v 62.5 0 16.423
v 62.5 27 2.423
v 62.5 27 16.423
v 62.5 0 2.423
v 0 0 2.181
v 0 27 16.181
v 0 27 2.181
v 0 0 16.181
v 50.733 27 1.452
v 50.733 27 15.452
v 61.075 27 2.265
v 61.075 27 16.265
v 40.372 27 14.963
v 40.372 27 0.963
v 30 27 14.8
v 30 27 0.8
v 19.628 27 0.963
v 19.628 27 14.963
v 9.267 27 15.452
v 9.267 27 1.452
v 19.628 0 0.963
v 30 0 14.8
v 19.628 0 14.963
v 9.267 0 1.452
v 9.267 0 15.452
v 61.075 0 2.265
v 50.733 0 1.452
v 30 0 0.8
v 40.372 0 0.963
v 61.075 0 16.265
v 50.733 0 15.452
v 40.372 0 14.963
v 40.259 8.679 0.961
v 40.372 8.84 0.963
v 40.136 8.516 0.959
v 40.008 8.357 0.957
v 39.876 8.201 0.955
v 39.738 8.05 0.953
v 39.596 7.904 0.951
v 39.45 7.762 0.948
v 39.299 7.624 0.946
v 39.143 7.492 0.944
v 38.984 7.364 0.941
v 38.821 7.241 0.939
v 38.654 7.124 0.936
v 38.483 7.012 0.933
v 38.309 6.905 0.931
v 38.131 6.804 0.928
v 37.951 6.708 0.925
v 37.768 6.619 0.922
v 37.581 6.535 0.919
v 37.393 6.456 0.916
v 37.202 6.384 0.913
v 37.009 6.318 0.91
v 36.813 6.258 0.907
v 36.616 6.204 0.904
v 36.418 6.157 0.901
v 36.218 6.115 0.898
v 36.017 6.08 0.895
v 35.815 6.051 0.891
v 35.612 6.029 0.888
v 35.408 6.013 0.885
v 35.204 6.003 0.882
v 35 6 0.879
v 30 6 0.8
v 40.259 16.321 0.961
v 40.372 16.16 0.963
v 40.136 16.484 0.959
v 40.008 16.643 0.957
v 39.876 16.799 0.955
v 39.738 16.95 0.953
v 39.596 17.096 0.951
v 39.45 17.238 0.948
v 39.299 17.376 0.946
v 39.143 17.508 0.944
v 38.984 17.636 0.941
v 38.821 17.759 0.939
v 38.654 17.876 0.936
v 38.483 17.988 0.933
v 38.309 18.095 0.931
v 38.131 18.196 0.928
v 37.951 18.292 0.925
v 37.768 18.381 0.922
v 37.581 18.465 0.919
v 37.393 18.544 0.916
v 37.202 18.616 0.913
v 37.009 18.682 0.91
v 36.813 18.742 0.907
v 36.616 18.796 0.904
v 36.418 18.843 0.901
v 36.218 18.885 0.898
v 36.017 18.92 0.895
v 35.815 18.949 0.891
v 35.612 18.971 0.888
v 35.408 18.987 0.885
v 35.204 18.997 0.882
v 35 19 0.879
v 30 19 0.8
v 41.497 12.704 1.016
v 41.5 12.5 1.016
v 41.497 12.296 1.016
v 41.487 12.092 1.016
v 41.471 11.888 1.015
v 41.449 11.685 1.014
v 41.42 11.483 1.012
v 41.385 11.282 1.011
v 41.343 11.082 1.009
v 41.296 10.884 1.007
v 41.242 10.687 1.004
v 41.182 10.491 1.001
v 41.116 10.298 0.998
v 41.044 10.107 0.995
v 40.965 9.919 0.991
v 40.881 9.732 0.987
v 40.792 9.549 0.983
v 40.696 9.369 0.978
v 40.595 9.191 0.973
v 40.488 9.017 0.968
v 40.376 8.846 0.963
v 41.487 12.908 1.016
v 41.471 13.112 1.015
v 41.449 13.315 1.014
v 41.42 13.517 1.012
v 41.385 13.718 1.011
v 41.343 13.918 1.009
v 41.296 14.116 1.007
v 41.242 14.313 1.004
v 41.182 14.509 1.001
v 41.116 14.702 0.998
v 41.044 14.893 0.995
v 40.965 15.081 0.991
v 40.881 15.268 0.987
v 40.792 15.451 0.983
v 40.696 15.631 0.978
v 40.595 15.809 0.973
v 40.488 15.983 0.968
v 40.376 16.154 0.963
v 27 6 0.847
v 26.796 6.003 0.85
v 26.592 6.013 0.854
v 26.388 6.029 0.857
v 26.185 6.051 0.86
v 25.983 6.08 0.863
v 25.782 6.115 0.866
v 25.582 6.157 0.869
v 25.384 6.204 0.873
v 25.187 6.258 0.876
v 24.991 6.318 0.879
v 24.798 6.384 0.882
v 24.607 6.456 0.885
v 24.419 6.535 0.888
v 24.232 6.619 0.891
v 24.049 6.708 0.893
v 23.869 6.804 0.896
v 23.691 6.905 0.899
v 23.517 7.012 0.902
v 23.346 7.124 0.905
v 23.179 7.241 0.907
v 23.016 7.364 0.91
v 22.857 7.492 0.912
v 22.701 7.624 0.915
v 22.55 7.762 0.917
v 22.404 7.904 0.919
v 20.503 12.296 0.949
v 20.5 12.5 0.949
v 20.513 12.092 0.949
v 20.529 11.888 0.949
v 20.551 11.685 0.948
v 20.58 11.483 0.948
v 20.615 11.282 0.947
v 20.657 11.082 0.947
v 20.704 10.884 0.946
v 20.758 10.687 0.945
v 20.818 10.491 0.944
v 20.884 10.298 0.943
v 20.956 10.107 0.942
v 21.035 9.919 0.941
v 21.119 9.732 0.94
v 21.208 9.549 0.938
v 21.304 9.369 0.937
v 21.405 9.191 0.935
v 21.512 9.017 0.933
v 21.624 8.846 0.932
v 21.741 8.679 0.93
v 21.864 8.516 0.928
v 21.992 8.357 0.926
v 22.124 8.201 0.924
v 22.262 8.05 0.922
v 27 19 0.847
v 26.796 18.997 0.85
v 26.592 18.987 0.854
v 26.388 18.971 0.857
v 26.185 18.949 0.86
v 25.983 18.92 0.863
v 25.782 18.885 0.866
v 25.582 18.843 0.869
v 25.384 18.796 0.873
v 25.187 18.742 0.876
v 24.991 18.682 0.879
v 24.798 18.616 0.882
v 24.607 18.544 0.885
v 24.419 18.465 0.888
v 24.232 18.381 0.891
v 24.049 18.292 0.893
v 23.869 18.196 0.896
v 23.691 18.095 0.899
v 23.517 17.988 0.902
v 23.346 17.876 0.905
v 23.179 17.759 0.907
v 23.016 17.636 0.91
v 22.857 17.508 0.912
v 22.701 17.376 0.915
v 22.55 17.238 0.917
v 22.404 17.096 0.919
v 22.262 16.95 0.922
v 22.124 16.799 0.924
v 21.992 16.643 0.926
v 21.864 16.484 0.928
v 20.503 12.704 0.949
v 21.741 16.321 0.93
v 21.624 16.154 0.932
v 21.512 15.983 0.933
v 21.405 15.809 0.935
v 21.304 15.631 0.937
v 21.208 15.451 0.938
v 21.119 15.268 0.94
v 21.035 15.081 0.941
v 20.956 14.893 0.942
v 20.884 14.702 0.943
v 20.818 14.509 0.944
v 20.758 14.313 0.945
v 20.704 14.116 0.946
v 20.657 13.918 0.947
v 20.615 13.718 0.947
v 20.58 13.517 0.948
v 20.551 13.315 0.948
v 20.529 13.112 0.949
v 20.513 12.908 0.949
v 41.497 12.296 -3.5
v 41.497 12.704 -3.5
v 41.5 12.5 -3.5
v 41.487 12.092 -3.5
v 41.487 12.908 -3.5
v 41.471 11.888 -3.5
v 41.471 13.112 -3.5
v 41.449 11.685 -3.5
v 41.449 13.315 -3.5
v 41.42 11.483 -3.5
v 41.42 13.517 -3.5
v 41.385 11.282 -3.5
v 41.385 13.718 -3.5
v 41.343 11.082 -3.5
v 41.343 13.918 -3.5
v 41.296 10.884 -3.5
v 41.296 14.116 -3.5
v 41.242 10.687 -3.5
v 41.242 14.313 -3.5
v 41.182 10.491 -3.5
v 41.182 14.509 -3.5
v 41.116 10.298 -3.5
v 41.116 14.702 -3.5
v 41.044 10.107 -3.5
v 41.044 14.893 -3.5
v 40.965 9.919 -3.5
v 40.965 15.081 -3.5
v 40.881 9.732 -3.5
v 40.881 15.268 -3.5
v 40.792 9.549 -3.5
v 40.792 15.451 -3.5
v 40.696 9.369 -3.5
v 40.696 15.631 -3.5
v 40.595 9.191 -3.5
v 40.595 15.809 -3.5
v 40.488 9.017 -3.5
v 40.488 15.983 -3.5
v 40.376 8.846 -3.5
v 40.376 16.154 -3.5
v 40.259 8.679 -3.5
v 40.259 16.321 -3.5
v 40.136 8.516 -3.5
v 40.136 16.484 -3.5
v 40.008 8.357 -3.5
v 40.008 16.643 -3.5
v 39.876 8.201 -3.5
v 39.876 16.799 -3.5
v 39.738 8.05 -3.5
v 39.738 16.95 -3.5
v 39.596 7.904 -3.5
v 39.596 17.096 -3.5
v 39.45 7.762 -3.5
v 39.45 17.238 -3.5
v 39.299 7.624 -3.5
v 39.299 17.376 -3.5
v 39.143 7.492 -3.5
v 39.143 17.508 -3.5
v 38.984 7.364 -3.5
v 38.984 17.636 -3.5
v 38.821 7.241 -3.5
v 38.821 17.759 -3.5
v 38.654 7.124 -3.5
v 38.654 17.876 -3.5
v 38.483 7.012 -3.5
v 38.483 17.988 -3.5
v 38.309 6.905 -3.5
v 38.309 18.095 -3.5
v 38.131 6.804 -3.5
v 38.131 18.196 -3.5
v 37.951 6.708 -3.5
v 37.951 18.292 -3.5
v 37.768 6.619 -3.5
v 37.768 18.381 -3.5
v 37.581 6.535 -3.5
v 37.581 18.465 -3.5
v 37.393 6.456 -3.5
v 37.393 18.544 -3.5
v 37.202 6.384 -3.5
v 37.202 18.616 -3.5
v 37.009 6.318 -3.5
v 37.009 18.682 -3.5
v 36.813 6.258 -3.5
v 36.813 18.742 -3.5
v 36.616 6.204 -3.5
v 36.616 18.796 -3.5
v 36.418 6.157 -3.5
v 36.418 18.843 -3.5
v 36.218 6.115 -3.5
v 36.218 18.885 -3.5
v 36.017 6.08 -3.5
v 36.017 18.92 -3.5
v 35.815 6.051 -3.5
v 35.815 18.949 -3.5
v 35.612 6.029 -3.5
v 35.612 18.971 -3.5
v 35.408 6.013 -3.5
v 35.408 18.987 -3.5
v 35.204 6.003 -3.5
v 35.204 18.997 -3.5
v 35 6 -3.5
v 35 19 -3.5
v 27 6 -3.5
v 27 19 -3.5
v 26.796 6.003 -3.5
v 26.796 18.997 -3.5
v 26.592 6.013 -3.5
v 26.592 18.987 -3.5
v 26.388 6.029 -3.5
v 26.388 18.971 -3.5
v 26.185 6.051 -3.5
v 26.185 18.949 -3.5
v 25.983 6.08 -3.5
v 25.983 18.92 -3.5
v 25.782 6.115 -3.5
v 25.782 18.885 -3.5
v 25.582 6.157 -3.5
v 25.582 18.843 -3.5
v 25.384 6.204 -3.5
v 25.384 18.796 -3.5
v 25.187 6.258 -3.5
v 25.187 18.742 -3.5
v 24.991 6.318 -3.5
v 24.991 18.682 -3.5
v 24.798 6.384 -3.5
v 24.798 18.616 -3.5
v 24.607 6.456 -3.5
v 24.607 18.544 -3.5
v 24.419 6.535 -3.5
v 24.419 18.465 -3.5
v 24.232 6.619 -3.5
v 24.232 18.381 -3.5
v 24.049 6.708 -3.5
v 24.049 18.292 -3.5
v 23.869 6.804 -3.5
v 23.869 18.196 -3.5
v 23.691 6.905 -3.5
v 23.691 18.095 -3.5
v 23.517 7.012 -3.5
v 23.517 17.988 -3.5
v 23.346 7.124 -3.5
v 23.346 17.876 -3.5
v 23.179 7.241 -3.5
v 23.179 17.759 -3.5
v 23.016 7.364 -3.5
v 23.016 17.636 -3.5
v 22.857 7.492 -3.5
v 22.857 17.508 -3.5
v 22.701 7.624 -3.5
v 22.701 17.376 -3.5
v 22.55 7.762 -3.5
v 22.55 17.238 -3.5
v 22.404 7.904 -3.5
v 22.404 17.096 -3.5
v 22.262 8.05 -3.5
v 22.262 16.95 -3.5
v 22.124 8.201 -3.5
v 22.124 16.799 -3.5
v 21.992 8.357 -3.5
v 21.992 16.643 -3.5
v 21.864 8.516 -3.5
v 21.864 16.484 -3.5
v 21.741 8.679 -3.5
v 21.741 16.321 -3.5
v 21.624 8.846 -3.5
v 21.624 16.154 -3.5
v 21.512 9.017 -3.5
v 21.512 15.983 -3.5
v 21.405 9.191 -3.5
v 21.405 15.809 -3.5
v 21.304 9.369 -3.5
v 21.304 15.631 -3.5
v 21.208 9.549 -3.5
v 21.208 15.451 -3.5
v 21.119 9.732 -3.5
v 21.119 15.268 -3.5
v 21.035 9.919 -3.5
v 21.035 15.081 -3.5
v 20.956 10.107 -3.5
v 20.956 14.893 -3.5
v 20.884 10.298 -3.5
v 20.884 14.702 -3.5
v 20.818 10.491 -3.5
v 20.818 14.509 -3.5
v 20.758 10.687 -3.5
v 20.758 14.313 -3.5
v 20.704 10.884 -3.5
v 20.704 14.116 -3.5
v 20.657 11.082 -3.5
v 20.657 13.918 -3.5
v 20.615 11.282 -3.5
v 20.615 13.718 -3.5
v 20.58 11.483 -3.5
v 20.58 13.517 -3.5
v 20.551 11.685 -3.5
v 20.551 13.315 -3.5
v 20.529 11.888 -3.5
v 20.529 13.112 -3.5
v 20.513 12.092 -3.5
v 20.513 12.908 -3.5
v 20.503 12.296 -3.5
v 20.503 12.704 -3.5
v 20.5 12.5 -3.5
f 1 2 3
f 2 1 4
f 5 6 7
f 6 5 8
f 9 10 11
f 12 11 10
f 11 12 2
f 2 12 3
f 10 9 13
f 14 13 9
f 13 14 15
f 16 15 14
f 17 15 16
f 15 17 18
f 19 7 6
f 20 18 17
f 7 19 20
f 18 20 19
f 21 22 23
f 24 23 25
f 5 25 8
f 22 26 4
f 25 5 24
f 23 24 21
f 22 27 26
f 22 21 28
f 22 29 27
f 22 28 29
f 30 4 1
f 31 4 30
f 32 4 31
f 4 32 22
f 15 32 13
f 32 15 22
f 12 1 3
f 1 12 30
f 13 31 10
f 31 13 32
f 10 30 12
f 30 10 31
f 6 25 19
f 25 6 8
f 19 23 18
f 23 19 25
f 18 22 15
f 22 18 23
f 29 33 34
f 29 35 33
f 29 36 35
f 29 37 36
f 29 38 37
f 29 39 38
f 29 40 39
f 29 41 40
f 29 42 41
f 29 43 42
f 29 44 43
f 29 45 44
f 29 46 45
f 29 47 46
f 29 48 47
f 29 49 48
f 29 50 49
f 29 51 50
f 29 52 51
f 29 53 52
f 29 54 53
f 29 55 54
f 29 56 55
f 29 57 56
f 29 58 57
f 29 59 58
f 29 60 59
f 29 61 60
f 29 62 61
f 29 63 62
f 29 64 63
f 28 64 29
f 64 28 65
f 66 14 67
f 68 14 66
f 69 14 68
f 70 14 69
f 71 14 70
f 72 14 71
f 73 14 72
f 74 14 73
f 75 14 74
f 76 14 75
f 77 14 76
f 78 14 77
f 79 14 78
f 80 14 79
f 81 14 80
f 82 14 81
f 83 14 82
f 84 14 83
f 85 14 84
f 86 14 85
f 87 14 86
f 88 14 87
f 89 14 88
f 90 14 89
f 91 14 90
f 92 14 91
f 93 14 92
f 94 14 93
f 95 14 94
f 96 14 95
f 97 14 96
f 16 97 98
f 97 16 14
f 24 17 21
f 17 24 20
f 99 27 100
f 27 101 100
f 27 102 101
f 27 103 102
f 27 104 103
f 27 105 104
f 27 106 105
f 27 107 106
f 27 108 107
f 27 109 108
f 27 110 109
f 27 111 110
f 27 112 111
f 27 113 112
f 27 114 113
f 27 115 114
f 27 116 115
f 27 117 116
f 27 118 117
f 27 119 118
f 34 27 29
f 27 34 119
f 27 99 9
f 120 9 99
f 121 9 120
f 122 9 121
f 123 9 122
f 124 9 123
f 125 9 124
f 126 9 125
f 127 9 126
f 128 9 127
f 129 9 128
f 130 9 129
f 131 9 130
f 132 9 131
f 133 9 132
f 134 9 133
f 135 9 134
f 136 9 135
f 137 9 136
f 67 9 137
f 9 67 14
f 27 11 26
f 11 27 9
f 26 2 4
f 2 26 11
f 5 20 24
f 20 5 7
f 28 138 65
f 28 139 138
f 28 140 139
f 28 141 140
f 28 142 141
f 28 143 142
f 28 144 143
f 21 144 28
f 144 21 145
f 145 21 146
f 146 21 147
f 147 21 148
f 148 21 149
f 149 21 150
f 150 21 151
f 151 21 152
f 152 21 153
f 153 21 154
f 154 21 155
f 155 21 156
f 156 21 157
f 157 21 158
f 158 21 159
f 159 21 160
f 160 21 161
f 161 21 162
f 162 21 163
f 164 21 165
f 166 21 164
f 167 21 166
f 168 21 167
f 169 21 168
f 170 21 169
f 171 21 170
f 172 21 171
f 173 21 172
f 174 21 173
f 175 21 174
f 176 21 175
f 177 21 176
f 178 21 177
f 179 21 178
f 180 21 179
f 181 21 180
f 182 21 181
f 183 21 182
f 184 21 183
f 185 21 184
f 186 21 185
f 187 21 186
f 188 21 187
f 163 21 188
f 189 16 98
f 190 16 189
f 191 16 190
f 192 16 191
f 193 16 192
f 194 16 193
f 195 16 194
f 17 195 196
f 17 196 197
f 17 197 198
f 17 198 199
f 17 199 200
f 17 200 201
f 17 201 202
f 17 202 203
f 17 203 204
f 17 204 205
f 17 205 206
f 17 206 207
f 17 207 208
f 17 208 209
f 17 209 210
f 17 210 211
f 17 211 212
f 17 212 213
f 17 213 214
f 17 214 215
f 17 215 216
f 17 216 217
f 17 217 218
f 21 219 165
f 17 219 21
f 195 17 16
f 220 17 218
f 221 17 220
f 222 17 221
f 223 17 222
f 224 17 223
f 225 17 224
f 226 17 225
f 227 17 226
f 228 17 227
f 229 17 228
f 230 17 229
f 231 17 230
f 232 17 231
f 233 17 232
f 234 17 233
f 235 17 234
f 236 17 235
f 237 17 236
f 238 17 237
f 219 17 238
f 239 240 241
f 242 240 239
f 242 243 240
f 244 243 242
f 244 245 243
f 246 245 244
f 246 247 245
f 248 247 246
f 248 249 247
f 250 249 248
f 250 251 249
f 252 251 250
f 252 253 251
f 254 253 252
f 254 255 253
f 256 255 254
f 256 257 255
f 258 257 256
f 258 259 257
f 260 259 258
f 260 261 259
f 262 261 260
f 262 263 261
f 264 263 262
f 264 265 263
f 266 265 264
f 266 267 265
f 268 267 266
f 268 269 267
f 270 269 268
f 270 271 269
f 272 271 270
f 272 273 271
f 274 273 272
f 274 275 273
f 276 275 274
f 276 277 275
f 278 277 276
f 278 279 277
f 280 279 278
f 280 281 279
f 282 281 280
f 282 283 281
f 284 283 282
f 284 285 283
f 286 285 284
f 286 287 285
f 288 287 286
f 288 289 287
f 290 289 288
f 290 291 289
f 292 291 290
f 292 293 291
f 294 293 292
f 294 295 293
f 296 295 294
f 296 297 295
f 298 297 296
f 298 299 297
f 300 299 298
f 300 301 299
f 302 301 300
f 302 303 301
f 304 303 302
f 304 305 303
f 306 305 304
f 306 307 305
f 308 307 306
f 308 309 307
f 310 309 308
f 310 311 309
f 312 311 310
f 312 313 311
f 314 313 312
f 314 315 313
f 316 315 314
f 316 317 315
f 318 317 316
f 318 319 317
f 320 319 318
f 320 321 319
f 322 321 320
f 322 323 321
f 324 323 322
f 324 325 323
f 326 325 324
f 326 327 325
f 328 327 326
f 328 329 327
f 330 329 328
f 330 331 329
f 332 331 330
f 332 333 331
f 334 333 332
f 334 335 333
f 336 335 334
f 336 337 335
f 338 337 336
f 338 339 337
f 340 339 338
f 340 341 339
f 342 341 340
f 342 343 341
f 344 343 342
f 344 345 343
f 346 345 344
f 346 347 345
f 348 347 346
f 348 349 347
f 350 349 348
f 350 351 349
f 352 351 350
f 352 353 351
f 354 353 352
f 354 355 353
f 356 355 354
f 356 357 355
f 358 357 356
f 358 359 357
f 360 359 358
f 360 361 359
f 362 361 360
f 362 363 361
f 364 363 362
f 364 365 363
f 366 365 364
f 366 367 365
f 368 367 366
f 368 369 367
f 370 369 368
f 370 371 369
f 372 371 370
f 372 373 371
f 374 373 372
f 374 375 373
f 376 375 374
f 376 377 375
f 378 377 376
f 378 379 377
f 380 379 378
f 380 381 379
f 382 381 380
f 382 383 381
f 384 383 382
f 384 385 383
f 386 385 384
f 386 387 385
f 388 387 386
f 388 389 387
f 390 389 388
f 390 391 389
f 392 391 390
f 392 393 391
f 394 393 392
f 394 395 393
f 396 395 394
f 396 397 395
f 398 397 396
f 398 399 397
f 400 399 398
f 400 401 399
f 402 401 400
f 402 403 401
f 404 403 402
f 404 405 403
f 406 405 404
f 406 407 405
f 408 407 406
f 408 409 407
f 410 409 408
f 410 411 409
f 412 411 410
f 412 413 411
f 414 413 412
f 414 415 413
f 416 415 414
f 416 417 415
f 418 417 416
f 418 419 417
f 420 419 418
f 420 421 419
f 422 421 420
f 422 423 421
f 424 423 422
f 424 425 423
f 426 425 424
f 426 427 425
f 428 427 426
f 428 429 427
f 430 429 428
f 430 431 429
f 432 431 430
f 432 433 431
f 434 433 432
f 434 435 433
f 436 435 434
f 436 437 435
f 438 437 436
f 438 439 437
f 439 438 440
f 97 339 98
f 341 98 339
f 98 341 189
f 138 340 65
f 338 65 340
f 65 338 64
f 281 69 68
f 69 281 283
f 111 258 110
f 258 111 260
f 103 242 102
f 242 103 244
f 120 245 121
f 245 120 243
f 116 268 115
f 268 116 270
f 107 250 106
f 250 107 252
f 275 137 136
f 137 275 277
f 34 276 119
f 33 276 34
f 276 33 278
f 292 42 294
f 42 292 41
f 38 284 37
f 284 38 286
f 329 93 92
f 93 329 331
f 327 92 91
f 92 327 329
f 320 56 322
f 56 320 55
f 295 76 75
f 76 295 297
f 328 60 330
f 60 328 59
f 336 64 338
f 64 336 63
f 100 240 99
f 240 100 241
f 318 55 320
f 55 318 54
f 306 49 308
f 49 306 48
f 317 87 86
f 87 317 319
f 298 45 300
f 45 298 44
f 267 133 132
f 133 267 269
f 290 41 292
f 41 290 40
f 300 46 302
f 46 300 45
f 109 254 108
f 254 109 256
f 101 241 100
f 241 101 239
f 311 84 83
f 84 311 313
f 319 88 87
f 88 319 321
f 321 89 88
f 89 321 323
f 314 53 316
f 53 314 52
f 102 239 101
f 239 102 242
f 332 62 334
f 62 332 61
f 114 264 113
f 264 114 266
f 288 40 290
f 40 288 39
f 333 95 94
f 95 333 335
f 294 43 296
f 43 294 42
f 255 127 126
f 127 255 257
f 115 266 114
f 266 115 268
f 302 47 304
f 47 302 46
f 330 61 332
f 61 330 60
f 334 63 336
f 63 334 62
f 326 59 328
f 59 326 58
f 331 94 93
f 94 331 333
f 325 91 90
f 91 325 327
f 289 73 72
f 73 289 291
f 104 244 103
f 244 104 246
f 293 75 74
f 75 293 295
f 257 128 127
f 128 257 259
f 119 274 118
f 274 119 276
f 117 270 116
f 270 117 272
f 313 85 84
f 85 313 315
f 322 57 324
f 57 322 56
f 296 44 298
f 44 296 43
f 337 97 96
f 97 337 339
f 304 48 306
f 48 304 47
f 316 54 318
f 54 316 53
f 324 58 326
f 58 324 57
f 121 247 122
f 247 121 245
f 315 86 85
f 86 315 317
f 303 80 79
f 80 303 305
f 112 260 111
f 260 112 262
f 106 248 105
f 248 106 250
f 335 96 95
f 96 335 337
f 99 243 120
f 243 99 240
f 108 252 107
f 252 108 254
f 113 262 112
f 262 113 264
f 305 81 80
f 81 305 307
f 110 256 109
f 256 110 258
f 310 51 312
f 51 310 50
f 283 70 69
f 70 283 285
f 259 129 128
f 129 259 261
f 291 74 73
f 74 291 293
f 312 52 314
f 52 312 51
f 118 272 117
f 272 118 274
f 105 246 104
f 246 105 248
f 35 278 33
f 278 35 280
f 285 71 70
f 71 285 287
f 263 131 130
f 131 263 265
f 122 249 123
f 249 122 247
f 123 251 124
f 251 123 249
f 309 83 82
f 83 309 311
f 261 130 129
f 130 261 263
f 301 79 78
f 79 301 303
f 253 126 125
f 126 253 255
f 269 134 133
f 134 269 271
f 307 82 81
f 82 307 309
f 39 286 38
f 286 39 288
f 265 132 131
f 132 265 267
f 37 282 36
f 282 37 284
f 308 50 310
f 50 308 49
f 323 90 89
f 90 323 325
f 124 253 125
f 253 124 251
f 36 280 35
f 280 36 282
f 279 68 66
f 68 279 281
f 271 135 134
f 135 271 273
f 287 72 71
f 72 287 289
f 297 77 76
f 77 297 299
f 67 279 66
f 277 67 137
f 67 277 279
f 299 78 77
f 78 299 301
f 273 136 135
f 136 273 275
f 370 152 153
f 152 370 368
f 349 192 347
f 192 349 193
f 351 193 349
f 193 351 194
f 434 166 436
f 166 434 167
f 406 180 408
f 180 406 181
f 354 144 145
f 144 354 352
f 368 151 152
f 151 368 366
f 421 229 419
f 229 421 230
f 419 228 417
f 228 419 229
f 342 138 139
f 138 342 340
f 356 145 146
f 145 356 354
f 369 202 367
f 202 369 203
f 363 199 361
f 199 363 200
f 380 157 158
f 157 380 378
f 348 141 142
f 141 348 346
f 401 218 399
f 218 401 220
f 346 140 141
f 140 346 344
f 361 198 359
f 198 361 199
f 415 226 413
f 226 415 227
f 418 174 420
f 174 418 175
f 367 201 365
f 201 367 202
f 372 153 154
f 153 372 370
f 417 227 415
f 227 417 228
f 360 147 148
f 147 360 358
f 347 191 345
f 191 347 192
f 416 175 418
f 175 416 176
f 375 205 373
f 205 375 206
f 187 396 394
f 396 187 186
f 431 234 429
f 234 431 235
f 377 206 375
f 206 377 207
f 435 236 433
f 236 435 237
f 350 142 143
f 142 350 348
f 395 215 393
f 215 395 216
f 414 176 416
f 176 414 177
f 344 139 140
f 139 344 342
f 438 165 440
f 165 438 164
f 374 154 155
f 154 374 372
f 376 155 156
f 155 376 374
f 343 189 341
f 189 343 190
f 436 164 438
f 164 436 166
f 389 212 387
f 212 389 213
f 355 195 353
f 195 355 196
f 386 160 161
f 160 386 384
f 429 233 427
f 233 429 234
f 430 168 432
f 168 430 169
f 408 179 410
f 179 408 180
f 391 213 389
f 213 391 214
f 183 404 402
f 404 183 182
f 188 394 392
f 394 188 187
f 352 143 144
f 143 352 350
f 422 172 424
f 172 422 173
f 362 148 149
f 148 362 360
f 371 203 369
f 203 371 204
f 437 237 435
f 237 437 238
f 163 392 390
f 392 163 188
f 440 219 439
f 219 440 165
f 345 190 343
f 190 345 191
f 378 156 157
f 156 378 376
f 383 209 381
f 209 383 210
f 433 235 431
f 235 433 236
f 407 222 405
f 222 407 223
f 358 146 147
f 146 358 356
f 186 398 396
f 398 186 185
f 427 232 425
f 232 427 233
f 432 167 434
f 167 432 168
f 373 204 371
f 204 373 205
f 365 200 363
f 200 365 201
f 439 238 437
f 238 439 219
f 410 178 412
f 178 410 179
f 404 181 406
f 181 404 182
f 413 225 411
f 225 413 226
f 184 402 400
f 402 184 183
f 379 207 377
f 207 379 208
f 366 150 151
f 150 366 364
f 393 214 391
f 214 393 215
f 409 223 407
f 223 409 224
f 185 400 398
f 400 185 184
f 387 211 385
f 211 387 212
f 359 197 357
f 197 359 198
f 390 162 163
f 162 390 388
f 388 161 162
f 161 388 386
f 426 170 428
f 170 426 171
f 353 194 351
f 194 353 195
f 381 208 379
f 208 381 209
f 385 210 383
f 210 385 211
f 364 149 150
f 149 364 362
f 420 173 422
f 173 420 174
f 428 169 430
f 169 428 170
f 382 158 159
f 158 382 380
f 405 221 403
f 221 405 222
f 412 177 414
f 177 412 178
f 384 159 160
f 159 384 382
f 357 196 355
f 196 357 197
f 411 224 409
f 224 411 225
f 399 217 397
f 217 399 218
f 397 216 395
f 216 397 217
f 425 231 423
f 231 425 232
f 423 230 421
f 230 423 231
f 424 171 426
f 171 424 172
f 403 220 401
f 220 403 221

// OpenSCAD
$fn = 200;
module switch_hole() {
  translate([0,0,-6.5]) {
    color([1,0,0]) cube([5,8,13]);
  }
  rotate([0,90,0]) cylinder(h=5, r=6.5);
  translate([0,8,0]) {
    rotate([0,90,0]) cylinder(h=5, r=6.5);
  }
}

function get_switch_x() = 62.5;
function get_switch_y() = 27;

module switch() {
  // make the front curvy
  intersection() {
    // remove a cylinder from the back to add a curve
    difference() {
      cube([get_switch_x(),get_switch_y(),18]);

      translate([30,27,345]) {
        rotate([90,0,0])
        color([1,0,0])
        cylinder(h=27, r=330.2);
      }
    }

    translate([30,27,331]) {
      rotate([90,0,0])
      color([1,0,0])
      cylinder(h=27, r=330.2);
    }
  }

  // switch_hole();
  translate([65 / 2 + 2.5, 12.5,1.5]) {
    rotate([0,90,90]) { switch_hole(); }
  }
}

// translate([30,27,345]) {
  // rotate([90,0,0])
  // color([1,0,0])
  // cylinder(h=27, r=330.2);
// }
switch();
